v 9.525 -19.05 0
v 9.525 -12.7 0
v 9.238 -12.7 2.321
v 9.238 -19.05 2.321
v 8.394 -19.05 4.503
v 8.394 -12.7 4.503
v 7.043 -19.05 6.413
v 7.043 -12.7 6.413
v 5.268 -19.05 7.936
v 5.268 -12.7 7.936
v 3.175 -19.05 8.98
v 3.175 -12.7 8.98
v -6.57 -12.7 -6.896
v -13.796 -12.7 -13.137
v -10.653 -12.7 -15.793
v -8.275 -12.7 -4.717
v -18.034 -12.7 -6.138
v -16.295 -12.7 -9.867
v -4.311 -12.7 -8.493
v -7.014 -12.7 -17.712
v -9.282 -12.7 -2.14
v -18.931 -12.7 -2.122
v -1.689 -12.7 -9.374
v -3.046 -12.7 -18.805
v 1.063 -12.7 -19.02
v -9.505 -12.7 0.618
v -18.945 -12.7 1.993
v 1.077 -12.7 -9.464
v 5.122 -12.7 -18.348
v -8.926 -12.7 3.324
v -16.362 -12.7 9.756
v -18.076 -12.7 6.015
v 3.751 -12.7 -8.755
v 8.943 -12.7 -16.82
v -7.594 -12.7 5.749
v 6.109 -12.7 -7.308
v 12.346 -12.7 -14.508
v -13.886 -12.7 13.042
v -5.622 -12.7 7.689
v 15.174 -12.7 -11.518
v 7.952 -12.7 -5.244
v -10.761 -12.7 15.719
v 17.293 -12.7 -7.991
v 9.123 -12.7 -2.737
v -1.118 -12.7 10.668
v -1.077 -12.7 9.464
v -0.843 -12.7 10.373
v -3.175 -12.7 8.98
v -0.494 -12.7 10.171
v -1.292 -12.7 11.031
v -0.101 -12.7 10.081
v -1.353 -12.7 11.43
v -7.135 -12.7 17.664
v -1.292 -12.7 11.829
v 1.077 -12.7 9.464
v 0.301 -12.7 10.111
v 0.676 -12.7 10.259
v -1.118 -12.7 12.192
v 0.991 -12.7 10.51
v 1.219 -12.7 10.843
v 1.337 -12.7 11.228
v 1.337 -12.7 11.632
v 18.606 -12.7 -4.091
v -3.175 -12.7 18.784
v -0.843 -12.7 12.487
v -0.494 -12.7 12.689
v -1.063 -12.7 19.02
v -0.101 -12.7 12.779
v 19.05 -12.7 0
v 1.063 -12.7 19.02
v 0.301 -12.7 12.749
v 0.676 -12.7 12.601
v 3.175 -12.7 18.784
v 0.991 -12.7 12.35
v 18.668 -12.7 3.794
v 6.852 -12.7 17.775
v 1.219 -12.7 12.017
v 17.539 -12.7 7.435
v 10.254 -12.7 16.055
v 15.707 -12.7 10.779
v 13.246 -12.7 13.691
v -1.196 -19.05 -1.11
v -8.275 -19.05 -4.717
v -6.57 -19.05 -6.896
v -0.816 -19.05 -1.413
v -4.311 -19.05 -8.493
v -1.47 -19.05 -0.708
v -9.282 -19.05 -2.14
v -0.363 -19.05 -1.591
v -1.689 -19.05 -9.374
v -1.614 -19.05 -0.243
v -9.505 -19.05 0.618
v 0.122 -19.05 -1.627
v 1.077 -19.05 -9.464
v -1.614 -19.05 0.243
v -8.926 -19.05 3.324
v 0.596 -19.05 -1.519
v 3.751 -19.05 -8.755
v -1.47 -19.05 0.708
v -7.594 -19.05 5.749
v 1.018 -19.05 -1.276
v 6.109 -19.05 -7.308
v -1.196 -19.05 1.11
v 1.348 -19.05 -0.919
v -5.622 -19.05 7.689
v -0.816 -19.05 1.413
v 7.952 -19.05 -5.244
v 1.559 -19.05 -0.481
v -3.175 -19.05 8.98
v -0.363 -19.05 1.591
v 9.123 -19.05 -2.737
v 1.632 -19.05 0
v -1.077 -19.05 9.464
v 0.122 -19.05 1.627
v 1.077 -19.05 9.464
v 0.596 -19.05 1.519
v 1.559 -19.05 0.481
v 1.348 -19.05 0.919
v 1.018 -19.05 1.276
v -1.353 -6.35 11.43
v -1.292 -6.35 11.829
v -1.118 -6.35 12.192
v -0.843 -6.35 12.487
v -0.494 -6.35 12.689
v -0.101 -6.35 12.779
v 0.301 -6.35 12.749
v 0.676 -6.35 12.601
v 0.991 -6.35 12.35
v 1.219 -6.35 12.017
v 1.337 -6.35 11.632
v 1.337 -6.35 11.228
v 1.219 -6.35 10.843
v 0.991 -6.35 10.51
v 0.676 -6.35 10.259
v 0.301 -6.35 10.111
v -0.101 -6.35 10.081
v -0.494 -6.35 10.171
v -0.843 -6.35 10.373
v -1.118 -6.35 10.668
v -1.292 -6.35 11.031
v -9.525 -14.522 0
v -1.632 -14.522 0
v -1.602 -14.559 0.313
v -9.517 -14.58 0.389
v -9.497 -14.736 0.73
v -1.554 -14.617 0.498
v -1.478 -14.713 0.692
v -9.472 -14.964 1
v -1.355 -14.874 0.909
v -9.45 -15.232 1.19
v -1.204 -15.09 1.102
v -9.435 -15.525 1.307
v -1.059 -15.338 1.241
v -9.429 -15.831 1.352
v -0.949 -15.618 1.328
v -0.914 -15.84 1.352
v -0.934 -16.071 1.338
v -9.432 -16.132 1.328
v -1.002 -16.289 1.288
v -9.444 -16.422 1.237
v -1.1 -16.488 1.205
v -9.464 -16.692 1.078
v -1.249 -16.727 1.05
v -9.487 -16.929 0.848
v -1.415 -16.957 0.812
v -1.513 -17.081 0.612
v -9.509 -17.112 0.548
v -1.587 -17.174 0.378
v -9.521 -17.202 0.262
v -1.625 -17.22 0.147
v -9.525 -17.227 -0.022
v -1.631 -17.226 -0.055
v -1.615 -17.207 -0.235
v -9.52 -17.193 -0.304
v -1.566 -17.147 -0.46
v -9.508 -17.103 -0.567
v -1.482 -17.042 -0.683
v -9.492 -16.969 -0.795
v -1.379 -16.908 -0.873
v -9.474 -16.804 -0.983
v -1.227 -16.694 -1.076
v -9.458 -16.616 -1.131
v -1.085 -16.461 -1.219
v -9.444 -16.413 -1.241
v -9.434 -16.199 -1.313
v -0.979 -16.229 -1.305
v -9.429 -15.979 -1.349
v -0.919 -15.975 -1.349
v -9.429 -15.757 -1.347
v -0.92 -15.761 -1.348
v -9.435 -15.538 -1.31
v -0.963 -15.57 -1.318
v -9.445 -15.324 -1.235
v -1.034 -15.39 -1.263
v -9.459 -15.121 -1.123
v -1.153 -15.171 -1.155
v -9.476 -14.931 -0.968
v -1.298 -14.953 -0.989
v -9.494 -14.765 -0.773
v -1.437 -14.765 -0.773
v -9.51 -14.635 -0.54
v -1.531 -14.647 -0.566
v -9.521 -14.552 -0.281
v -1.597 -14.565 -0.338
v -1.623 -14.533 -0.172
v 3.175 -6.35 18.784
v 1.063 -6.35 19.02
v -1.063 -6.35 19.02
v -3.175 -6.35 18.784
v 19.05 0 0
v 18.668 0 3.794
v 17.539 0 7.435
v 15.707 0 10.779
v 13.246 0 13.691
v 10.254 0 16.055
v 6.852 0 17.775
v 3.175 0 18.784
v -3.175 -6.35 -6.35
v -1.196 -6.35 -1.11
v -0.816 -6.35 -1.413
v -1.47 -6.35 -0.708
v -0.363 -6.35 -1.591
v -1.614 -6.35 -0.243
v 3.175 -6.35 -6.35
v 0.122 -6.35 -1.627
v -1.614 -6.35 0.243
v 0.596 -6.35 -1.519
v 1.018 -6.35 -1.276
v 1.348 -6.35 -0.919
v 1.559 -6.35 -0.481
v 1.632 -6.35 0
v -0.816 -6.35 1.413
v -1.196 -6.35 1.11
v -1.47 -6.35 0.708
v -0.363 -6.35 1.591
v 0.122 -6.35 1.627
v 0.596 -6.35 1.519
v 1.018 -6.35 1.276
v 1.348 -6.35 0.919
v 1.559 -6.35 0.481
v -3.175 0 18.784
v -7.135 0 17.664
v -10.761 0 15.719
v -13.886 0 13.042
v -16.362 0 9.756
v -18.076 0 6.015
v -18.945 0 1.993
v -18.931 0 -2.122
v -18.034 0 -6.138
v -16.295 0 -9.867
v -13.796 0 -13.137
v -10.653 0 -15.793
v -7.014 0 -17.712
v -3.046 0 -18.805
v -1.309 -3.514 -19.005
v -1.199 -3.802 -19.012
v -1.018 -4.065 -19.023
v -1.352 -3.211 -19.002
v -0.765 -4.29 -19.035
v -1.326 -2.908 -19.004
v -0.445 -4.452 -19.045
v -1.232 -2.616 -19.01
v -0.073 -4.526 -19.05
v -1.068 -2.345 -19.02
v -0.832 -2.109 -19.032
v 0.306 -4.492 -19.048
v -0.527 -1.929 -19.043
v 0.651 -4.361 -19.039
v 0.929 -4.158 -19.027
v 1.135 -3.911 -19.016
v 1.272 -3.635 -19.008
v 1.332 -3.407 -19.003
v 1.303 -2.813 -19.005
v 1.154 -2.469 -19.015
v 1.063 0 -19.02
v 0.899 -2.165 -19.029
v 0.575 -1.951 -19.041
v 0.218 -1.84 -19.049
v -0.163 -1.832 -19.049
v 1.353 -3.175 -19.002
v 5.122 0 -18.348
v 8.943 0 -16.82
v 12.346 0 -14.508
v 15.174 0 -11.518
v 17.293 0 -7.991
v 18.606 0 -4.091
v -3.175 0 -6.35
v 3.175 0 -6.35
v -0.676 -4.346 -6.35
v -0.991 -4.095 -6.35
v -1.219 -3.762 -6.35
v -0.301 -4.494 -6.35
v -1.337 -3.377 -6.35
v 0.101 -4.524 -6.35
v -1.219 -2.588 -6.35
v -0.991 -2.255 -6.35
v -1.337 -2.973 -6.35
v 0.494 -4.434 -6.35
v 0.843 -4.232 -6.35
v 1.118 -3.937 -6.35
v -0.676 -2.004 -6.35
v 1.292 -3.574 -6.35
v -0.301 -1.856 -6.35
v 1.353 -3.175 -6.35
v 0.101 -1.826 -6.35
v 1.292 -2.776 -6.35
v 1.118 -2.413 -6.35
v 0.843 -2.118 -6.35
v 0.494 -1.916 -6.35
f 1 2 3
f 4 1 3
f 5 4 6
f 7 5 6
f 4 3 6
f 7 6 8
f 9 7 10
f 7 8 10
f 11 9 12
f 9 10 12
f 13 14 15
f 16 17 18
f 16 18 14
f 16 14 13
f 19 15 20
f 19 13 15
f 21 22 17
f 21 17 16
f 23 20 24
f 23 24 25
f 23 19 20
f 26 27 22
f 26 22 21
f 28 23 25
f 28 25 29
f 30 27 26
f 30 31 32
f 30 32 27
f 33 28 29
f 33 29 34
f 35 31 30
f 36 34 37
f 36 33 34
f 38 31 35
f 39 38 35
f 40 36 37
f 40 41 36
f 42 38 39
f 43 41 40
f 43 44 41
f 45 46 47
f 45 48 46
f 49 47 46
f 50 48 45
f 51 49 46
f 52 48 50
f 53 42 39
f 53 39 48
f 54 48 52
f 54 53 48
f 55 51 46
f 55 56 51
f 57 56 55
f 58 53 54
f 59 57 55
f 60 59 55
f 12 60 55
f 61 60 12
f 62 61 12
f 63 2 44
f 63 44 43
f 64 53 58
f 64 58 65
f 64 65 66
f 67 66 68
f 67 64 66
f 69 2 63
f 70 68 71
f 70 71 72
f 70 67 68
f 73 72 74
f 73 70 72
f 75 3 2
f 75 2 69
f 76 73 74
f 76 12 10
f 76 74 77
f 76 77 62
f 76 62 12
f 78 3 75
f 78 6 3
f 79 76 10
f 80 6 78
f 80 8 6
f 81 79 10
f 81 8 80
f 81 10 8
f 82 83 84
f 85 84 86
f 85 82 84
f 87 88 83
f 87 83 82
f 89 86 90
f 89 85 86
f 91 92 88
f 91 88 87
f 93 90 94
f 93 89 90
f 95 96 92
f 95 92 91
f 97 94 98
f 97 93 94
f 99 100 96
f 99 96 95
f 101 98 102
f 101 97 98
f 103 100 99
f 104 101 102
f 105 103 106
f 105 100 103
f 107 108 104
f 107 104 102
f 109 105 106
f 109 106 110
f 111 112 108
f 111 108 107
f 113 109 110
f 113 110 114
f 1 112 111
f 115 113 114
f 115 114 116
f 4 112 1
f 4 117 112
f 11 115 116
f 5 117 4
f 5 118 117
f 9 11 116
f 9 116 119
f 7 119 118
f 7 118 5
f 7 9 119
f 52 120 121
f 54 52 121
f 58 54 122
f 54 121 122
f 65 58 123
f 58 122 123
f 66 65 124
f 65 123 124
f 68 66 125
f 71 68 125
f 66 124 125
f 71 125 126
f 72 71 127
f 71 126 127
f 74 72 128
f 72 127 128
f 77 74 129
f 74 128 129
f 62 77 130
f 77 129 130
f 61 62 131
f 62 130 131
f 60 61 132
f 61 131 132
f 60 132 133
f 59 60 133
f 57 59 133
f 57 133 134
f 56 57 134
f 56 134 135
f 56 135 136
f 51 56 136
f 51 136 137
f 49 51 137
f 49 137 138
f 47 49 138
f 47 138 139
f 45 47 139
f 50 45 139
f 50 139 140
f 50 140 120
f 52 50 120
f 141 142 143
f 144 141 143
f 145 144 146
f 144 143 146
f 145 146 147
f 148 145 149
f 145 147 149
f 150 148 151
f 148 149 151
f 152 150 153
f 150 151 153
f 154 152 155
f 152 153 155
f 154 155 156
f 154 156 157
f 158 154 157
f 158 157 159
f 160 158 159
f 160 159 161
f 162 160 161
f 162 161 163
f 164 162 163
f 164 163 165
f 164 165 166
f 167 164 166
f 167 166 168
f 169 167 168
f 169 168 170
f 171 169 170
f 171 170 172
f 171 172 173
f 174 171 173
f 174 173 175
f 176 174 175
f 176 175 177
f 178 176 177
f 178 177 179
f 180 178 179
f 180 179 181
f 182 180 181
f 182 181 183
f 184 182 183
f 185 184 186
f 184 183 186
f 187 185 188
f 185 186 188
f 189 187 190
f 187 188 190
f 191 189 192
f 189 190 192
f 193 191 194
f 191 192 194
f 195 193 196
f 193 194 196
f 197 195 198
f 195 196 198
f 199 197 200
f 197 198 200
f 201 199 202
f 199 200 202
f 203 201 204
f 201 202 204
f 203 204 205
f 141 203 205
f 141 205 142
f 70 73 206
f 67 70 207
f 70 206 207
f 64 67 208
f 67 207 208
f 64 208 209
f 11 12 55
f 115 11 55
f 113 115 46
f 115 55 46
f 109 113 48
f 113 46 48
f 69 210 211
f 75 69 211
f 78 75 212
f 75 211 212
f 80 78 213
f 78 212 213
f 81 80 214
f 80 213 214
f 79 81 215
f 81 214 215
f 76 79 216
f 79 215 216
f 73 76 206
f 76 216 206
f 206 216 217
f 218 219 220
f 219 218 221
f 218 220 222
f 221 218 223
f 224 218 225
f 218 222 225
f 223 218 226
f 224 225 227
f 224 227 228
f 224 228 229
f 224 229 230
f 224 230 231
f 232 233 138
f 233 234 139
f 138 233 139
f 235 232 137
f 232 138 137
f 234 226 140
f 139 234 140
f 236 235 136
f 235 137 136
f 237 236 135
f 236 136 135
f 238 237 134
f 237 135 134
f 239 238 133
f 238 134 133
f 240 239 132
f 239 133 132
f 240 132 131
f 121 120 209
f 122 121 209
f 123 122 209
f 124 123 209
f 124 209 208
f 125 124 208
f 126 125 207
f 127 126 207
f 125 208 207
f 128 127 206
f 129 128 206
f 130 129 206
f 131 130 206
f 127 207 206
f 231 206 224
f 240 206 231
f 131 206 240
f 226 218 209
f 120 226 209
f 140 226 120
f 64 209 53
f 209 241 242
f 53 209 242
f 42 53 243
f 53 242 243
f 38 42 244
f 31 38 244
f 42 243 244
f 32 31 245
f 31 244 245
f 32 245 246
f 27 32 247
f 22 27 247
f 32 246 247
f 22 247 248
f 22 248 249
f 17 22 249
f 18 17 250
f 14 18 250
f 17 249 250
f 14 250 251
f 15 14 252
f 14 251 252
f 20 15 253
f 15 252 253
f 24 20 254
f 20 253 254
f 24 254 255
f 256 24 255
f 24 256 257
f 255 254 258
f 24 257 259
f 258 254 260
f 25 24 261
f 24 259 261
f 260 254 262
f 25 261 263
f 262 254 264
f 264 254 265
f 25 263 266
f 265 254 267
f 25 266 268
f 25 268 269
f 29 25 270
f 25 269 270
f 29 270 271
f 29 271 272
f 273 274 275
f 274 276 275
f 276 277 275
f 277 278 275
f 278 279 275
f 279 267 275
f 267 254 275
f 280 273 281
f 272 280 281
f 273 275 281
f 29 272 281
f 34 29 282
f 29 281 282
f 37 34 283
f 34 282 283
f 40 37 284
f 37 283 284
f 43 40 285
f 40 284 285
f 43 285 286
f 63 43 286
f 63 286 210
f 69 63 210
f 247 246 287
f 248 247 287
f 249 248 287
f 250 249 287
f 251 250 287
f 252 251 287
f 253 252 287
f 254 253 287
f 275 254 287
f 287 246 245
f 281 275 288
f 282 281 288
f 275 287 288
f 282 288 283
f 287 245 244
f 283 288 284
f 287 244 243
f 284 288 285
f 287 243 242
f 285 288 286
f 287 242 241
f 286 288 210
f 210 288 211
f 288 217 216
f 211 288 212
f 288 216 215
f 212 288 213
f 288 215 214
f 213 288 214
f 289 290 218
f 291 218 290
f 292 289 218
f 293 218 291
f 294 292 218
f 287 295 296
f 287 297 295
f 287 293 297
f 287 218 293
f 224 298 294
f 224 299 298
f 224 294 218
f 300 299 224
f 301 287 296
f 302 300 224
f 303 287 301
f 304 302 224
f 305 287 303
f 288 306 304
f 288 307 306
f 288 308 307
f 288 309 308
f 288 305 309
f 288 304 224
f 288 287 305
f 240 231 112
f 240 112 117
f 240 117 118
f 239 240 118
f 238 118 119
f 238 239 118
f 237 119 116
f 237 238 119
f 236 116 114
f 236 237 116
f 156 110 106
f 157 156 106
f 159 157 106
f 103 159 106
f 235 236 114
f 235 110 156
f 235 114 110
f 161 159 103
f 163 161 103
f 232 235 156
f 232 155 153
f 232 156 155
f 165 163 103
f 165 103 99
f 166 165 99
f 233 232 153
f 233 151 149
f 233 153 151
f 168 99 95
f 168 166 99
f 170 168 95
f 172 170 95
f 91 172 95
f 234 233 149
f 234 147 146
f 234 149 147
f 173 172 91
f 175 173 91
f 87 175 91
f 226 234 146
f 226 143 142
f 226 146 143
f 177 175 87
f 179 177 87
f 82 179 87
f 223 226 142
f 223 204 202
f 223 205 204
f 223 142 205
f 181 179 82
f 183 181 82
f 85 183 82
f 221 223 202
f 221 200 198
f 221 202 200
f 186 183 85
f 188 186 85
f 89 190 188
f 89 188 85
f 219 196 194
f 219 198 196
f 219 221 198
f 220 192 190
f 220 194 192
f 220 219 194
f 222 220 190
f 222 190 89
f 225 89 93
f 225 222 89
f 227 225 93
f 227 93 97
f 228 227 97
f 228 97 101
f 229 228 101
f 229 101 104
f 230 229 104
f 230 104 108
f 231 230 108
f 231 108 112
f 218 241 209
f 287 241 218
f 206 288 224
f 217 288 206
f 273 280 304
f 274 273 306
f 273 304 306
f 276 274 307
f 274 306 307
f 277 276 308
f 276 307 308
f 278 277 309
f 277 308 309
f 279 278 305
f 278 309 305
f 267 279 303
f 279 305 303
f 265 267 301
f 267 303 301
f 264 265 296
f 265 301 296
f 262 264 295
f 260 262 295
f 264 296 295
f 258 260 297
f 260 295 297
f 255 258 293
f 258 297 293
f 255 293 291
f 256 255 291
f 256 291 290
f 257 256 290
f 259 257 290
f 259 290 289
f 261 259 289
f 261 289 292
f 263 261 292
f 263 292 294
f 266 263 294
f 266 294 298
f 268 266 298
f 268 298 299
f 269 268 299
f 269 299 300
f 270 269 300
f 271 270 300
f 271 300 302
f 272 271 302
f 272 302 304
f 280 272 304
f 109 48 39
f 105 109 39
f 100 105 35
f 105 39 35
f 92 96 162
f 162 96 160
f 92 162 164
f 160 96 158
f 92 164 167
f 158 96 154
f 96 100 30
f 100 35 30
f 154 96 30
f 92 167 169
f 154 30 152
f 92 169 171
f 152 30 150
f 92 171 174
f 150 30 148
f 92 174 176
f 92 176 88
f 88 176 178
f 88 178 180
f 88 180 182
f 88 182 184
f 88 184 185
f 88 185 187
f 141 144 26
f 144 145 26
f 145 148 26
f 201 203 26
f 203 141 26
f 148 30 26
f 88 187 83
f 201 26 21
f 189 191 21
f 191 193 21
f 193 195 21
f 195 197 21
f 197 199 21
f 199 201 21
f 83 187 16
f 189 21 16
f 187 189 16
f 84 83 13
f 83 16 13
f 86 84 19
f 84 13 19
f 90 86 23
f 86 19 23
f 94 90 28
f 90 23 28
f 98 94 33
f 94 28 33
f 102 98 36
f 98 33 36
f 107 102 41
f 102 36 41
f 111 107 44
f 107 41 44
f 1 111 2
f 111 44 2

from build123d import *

# Parameters (mm, degrees)
F1_DEPTH = 12.7
F0_R     = 1.63195
F2_DEPTH = 19.05
F3_R     = 1.35255
F4_DEPTH = 25.4
F5_DEPTH = 6.35
F6_R     = 1.35255
F7_DEPTH = 25.4
F8_R     = 1.35255
F9_DEPTH = 12.701


with BuildPart() as f1:
    # F0 (on Front) → F1 (new body)
    with BuildSketch(Plane.XZ):
        with BuildLine():
            ThreePointArc((-3.175, 18.7835533113), (-12.2967221242, -14.5496778315), (19.05, 0))
            ThreePointArc((19.05, 0), (14.5496778315, 12.2967221242), (3.175, 18.7835533113))
            Line((3.175, 18.7835533113), (3.175, 8.9802561211))
            ThreePointArc((3.175, 8.9802561211), (7.7771299333, 5.499261314), (9.525, 0))
            ThreePointArc((9.525, 0), (-5.499261314, -7.7771299333), (-3.175, 8.9802561211))
            Line((-3.175, 8.9802561211), (-3.175, 18.7835533113))
        make_face()
        with BuildLine():
            Line((3.175, 8.9802561211), (3.175, 18.7835533113))
            ThreePointArc((3.175, 18.7835533113), (0, 19.05), (-3.175, 18.7835533113))
            Line((-3.175, 18.7835533113), (-3.175, 8.9802561211))
            ThreePointArc((-3.175, 8.9802561211), (0, 9.525), (3.175, 8.9802561211))
        make_face()
    extrude(amount=F1_DEPTH)

    # F0 (on Front) → F2 (join)
    with BuildSketch(Plane.XZ):
        with BuildLine():
            Line((3.175, -6.35), (3.175, 8.9802561211))
            ThreePointArc((3.175, 8.9802561211), (0, 9.525), (-3.175, 8.9802561211))
            Line((-3.175, 8.9802561211), (-3.175, -6.35))
            Line((-3.175, -6.35), (3.175, -6.35))
        make_face()
        Circle(F0_R, mode=Mode.SUBTRACT)
        with BuildLine():
            ThreePointArc((9.525, 0), (7.7771299333, 5.499261314), (3.175, 8.9802561211))
            Line((3.175, 8.9802561211), (3.175, -6.35))
            Line((3.175, -6.35), (-3.175, -6.35))
            Line((-3.175, -6.35), (-3.175, 8.9802561211))
            ThreePointArc((-3.175, 8.9802561211), (-5.499261314, -7.7771299333), (9.525, 0))
        make_face()
    extrude(amount=F2_DEPTH)

    # F3 (on Right) → F4 (cut)
    with BuildSketch(Plane.YZ):
        with Locations((-15.875, 0)):
            Circle(F3_R)
    extrude(amount=-F4_DEPTH, mode=Mode.SUBTRACT)

    # F0 (on Front) → F5 (cut)
    with BuildSketch(Plane.XZ):
        with BuildLine():
            ThreePointArc((-3.175, 18.7835533113), (0, 19.05), (3.175, 18.7835533113))
            Line((3.175, 18.7835533113), (3.175, 19.7523720562))
            Line((3.175, 19.7523720562), (-3.175, 19.7523720562))
            Line((-3.175, 19.7523720562), (-3.175, 18.7835533113))
        make_face()
        with BuildLine():
            Line((3.175, 8.9802561211), (3.175, 18.7835533113))
            ThreePointArc((3.175, 18.7835533113), (0, 19.05), (-3.175, 18.7835533113))
            Line((-3.175, 18.7835533113), (-3.175, 8.9802561211))
            ThreePointArc((-3.175, 8.9802561211), (0, 9.525), (3.175, 8.9802561211))
        make_face()
        with BuildLine():
            Line((3.175, -6.35), (3.175, 8.9802561211))
            ThreePointArc((3.175, 8.9802561211), (0, 9.525), (-3.175, 8.9802561211))
            Line((-3.175, 8.9802561211), (-3.175, -6.35))
            Line((-3.175, -6.35), (3.175, -6.35))
        make_face()
        Circle(F0_R, mode=Mode.SUBTRACT)
    extrude(amount=F5_DEPTH, mode=Mode.SUBTRACT)

    # F6 (on face) → F7 (cut)
    with BuildSketch(Plane(origin=(0, -6.35, 0), x_dir=(-1, 0, 0), z_dir=(0, 1, 0))):
        with Locations((0, 11.43)):
            Circle(F6_R)
    extrude(amount=-F7_DEPTH, mode=Mode.SUBTRACT)

    # F8 (on face) → F9 (cut, through all)
    with BuildSketch(Plane.XY.offset(-6.35)):
        with Locations((0, -3.175)):
            Circle(F8_R)
    extrude(amount=-F9_DEPTH, mode=Mode.SUBTRACT)


solid = f1.part
